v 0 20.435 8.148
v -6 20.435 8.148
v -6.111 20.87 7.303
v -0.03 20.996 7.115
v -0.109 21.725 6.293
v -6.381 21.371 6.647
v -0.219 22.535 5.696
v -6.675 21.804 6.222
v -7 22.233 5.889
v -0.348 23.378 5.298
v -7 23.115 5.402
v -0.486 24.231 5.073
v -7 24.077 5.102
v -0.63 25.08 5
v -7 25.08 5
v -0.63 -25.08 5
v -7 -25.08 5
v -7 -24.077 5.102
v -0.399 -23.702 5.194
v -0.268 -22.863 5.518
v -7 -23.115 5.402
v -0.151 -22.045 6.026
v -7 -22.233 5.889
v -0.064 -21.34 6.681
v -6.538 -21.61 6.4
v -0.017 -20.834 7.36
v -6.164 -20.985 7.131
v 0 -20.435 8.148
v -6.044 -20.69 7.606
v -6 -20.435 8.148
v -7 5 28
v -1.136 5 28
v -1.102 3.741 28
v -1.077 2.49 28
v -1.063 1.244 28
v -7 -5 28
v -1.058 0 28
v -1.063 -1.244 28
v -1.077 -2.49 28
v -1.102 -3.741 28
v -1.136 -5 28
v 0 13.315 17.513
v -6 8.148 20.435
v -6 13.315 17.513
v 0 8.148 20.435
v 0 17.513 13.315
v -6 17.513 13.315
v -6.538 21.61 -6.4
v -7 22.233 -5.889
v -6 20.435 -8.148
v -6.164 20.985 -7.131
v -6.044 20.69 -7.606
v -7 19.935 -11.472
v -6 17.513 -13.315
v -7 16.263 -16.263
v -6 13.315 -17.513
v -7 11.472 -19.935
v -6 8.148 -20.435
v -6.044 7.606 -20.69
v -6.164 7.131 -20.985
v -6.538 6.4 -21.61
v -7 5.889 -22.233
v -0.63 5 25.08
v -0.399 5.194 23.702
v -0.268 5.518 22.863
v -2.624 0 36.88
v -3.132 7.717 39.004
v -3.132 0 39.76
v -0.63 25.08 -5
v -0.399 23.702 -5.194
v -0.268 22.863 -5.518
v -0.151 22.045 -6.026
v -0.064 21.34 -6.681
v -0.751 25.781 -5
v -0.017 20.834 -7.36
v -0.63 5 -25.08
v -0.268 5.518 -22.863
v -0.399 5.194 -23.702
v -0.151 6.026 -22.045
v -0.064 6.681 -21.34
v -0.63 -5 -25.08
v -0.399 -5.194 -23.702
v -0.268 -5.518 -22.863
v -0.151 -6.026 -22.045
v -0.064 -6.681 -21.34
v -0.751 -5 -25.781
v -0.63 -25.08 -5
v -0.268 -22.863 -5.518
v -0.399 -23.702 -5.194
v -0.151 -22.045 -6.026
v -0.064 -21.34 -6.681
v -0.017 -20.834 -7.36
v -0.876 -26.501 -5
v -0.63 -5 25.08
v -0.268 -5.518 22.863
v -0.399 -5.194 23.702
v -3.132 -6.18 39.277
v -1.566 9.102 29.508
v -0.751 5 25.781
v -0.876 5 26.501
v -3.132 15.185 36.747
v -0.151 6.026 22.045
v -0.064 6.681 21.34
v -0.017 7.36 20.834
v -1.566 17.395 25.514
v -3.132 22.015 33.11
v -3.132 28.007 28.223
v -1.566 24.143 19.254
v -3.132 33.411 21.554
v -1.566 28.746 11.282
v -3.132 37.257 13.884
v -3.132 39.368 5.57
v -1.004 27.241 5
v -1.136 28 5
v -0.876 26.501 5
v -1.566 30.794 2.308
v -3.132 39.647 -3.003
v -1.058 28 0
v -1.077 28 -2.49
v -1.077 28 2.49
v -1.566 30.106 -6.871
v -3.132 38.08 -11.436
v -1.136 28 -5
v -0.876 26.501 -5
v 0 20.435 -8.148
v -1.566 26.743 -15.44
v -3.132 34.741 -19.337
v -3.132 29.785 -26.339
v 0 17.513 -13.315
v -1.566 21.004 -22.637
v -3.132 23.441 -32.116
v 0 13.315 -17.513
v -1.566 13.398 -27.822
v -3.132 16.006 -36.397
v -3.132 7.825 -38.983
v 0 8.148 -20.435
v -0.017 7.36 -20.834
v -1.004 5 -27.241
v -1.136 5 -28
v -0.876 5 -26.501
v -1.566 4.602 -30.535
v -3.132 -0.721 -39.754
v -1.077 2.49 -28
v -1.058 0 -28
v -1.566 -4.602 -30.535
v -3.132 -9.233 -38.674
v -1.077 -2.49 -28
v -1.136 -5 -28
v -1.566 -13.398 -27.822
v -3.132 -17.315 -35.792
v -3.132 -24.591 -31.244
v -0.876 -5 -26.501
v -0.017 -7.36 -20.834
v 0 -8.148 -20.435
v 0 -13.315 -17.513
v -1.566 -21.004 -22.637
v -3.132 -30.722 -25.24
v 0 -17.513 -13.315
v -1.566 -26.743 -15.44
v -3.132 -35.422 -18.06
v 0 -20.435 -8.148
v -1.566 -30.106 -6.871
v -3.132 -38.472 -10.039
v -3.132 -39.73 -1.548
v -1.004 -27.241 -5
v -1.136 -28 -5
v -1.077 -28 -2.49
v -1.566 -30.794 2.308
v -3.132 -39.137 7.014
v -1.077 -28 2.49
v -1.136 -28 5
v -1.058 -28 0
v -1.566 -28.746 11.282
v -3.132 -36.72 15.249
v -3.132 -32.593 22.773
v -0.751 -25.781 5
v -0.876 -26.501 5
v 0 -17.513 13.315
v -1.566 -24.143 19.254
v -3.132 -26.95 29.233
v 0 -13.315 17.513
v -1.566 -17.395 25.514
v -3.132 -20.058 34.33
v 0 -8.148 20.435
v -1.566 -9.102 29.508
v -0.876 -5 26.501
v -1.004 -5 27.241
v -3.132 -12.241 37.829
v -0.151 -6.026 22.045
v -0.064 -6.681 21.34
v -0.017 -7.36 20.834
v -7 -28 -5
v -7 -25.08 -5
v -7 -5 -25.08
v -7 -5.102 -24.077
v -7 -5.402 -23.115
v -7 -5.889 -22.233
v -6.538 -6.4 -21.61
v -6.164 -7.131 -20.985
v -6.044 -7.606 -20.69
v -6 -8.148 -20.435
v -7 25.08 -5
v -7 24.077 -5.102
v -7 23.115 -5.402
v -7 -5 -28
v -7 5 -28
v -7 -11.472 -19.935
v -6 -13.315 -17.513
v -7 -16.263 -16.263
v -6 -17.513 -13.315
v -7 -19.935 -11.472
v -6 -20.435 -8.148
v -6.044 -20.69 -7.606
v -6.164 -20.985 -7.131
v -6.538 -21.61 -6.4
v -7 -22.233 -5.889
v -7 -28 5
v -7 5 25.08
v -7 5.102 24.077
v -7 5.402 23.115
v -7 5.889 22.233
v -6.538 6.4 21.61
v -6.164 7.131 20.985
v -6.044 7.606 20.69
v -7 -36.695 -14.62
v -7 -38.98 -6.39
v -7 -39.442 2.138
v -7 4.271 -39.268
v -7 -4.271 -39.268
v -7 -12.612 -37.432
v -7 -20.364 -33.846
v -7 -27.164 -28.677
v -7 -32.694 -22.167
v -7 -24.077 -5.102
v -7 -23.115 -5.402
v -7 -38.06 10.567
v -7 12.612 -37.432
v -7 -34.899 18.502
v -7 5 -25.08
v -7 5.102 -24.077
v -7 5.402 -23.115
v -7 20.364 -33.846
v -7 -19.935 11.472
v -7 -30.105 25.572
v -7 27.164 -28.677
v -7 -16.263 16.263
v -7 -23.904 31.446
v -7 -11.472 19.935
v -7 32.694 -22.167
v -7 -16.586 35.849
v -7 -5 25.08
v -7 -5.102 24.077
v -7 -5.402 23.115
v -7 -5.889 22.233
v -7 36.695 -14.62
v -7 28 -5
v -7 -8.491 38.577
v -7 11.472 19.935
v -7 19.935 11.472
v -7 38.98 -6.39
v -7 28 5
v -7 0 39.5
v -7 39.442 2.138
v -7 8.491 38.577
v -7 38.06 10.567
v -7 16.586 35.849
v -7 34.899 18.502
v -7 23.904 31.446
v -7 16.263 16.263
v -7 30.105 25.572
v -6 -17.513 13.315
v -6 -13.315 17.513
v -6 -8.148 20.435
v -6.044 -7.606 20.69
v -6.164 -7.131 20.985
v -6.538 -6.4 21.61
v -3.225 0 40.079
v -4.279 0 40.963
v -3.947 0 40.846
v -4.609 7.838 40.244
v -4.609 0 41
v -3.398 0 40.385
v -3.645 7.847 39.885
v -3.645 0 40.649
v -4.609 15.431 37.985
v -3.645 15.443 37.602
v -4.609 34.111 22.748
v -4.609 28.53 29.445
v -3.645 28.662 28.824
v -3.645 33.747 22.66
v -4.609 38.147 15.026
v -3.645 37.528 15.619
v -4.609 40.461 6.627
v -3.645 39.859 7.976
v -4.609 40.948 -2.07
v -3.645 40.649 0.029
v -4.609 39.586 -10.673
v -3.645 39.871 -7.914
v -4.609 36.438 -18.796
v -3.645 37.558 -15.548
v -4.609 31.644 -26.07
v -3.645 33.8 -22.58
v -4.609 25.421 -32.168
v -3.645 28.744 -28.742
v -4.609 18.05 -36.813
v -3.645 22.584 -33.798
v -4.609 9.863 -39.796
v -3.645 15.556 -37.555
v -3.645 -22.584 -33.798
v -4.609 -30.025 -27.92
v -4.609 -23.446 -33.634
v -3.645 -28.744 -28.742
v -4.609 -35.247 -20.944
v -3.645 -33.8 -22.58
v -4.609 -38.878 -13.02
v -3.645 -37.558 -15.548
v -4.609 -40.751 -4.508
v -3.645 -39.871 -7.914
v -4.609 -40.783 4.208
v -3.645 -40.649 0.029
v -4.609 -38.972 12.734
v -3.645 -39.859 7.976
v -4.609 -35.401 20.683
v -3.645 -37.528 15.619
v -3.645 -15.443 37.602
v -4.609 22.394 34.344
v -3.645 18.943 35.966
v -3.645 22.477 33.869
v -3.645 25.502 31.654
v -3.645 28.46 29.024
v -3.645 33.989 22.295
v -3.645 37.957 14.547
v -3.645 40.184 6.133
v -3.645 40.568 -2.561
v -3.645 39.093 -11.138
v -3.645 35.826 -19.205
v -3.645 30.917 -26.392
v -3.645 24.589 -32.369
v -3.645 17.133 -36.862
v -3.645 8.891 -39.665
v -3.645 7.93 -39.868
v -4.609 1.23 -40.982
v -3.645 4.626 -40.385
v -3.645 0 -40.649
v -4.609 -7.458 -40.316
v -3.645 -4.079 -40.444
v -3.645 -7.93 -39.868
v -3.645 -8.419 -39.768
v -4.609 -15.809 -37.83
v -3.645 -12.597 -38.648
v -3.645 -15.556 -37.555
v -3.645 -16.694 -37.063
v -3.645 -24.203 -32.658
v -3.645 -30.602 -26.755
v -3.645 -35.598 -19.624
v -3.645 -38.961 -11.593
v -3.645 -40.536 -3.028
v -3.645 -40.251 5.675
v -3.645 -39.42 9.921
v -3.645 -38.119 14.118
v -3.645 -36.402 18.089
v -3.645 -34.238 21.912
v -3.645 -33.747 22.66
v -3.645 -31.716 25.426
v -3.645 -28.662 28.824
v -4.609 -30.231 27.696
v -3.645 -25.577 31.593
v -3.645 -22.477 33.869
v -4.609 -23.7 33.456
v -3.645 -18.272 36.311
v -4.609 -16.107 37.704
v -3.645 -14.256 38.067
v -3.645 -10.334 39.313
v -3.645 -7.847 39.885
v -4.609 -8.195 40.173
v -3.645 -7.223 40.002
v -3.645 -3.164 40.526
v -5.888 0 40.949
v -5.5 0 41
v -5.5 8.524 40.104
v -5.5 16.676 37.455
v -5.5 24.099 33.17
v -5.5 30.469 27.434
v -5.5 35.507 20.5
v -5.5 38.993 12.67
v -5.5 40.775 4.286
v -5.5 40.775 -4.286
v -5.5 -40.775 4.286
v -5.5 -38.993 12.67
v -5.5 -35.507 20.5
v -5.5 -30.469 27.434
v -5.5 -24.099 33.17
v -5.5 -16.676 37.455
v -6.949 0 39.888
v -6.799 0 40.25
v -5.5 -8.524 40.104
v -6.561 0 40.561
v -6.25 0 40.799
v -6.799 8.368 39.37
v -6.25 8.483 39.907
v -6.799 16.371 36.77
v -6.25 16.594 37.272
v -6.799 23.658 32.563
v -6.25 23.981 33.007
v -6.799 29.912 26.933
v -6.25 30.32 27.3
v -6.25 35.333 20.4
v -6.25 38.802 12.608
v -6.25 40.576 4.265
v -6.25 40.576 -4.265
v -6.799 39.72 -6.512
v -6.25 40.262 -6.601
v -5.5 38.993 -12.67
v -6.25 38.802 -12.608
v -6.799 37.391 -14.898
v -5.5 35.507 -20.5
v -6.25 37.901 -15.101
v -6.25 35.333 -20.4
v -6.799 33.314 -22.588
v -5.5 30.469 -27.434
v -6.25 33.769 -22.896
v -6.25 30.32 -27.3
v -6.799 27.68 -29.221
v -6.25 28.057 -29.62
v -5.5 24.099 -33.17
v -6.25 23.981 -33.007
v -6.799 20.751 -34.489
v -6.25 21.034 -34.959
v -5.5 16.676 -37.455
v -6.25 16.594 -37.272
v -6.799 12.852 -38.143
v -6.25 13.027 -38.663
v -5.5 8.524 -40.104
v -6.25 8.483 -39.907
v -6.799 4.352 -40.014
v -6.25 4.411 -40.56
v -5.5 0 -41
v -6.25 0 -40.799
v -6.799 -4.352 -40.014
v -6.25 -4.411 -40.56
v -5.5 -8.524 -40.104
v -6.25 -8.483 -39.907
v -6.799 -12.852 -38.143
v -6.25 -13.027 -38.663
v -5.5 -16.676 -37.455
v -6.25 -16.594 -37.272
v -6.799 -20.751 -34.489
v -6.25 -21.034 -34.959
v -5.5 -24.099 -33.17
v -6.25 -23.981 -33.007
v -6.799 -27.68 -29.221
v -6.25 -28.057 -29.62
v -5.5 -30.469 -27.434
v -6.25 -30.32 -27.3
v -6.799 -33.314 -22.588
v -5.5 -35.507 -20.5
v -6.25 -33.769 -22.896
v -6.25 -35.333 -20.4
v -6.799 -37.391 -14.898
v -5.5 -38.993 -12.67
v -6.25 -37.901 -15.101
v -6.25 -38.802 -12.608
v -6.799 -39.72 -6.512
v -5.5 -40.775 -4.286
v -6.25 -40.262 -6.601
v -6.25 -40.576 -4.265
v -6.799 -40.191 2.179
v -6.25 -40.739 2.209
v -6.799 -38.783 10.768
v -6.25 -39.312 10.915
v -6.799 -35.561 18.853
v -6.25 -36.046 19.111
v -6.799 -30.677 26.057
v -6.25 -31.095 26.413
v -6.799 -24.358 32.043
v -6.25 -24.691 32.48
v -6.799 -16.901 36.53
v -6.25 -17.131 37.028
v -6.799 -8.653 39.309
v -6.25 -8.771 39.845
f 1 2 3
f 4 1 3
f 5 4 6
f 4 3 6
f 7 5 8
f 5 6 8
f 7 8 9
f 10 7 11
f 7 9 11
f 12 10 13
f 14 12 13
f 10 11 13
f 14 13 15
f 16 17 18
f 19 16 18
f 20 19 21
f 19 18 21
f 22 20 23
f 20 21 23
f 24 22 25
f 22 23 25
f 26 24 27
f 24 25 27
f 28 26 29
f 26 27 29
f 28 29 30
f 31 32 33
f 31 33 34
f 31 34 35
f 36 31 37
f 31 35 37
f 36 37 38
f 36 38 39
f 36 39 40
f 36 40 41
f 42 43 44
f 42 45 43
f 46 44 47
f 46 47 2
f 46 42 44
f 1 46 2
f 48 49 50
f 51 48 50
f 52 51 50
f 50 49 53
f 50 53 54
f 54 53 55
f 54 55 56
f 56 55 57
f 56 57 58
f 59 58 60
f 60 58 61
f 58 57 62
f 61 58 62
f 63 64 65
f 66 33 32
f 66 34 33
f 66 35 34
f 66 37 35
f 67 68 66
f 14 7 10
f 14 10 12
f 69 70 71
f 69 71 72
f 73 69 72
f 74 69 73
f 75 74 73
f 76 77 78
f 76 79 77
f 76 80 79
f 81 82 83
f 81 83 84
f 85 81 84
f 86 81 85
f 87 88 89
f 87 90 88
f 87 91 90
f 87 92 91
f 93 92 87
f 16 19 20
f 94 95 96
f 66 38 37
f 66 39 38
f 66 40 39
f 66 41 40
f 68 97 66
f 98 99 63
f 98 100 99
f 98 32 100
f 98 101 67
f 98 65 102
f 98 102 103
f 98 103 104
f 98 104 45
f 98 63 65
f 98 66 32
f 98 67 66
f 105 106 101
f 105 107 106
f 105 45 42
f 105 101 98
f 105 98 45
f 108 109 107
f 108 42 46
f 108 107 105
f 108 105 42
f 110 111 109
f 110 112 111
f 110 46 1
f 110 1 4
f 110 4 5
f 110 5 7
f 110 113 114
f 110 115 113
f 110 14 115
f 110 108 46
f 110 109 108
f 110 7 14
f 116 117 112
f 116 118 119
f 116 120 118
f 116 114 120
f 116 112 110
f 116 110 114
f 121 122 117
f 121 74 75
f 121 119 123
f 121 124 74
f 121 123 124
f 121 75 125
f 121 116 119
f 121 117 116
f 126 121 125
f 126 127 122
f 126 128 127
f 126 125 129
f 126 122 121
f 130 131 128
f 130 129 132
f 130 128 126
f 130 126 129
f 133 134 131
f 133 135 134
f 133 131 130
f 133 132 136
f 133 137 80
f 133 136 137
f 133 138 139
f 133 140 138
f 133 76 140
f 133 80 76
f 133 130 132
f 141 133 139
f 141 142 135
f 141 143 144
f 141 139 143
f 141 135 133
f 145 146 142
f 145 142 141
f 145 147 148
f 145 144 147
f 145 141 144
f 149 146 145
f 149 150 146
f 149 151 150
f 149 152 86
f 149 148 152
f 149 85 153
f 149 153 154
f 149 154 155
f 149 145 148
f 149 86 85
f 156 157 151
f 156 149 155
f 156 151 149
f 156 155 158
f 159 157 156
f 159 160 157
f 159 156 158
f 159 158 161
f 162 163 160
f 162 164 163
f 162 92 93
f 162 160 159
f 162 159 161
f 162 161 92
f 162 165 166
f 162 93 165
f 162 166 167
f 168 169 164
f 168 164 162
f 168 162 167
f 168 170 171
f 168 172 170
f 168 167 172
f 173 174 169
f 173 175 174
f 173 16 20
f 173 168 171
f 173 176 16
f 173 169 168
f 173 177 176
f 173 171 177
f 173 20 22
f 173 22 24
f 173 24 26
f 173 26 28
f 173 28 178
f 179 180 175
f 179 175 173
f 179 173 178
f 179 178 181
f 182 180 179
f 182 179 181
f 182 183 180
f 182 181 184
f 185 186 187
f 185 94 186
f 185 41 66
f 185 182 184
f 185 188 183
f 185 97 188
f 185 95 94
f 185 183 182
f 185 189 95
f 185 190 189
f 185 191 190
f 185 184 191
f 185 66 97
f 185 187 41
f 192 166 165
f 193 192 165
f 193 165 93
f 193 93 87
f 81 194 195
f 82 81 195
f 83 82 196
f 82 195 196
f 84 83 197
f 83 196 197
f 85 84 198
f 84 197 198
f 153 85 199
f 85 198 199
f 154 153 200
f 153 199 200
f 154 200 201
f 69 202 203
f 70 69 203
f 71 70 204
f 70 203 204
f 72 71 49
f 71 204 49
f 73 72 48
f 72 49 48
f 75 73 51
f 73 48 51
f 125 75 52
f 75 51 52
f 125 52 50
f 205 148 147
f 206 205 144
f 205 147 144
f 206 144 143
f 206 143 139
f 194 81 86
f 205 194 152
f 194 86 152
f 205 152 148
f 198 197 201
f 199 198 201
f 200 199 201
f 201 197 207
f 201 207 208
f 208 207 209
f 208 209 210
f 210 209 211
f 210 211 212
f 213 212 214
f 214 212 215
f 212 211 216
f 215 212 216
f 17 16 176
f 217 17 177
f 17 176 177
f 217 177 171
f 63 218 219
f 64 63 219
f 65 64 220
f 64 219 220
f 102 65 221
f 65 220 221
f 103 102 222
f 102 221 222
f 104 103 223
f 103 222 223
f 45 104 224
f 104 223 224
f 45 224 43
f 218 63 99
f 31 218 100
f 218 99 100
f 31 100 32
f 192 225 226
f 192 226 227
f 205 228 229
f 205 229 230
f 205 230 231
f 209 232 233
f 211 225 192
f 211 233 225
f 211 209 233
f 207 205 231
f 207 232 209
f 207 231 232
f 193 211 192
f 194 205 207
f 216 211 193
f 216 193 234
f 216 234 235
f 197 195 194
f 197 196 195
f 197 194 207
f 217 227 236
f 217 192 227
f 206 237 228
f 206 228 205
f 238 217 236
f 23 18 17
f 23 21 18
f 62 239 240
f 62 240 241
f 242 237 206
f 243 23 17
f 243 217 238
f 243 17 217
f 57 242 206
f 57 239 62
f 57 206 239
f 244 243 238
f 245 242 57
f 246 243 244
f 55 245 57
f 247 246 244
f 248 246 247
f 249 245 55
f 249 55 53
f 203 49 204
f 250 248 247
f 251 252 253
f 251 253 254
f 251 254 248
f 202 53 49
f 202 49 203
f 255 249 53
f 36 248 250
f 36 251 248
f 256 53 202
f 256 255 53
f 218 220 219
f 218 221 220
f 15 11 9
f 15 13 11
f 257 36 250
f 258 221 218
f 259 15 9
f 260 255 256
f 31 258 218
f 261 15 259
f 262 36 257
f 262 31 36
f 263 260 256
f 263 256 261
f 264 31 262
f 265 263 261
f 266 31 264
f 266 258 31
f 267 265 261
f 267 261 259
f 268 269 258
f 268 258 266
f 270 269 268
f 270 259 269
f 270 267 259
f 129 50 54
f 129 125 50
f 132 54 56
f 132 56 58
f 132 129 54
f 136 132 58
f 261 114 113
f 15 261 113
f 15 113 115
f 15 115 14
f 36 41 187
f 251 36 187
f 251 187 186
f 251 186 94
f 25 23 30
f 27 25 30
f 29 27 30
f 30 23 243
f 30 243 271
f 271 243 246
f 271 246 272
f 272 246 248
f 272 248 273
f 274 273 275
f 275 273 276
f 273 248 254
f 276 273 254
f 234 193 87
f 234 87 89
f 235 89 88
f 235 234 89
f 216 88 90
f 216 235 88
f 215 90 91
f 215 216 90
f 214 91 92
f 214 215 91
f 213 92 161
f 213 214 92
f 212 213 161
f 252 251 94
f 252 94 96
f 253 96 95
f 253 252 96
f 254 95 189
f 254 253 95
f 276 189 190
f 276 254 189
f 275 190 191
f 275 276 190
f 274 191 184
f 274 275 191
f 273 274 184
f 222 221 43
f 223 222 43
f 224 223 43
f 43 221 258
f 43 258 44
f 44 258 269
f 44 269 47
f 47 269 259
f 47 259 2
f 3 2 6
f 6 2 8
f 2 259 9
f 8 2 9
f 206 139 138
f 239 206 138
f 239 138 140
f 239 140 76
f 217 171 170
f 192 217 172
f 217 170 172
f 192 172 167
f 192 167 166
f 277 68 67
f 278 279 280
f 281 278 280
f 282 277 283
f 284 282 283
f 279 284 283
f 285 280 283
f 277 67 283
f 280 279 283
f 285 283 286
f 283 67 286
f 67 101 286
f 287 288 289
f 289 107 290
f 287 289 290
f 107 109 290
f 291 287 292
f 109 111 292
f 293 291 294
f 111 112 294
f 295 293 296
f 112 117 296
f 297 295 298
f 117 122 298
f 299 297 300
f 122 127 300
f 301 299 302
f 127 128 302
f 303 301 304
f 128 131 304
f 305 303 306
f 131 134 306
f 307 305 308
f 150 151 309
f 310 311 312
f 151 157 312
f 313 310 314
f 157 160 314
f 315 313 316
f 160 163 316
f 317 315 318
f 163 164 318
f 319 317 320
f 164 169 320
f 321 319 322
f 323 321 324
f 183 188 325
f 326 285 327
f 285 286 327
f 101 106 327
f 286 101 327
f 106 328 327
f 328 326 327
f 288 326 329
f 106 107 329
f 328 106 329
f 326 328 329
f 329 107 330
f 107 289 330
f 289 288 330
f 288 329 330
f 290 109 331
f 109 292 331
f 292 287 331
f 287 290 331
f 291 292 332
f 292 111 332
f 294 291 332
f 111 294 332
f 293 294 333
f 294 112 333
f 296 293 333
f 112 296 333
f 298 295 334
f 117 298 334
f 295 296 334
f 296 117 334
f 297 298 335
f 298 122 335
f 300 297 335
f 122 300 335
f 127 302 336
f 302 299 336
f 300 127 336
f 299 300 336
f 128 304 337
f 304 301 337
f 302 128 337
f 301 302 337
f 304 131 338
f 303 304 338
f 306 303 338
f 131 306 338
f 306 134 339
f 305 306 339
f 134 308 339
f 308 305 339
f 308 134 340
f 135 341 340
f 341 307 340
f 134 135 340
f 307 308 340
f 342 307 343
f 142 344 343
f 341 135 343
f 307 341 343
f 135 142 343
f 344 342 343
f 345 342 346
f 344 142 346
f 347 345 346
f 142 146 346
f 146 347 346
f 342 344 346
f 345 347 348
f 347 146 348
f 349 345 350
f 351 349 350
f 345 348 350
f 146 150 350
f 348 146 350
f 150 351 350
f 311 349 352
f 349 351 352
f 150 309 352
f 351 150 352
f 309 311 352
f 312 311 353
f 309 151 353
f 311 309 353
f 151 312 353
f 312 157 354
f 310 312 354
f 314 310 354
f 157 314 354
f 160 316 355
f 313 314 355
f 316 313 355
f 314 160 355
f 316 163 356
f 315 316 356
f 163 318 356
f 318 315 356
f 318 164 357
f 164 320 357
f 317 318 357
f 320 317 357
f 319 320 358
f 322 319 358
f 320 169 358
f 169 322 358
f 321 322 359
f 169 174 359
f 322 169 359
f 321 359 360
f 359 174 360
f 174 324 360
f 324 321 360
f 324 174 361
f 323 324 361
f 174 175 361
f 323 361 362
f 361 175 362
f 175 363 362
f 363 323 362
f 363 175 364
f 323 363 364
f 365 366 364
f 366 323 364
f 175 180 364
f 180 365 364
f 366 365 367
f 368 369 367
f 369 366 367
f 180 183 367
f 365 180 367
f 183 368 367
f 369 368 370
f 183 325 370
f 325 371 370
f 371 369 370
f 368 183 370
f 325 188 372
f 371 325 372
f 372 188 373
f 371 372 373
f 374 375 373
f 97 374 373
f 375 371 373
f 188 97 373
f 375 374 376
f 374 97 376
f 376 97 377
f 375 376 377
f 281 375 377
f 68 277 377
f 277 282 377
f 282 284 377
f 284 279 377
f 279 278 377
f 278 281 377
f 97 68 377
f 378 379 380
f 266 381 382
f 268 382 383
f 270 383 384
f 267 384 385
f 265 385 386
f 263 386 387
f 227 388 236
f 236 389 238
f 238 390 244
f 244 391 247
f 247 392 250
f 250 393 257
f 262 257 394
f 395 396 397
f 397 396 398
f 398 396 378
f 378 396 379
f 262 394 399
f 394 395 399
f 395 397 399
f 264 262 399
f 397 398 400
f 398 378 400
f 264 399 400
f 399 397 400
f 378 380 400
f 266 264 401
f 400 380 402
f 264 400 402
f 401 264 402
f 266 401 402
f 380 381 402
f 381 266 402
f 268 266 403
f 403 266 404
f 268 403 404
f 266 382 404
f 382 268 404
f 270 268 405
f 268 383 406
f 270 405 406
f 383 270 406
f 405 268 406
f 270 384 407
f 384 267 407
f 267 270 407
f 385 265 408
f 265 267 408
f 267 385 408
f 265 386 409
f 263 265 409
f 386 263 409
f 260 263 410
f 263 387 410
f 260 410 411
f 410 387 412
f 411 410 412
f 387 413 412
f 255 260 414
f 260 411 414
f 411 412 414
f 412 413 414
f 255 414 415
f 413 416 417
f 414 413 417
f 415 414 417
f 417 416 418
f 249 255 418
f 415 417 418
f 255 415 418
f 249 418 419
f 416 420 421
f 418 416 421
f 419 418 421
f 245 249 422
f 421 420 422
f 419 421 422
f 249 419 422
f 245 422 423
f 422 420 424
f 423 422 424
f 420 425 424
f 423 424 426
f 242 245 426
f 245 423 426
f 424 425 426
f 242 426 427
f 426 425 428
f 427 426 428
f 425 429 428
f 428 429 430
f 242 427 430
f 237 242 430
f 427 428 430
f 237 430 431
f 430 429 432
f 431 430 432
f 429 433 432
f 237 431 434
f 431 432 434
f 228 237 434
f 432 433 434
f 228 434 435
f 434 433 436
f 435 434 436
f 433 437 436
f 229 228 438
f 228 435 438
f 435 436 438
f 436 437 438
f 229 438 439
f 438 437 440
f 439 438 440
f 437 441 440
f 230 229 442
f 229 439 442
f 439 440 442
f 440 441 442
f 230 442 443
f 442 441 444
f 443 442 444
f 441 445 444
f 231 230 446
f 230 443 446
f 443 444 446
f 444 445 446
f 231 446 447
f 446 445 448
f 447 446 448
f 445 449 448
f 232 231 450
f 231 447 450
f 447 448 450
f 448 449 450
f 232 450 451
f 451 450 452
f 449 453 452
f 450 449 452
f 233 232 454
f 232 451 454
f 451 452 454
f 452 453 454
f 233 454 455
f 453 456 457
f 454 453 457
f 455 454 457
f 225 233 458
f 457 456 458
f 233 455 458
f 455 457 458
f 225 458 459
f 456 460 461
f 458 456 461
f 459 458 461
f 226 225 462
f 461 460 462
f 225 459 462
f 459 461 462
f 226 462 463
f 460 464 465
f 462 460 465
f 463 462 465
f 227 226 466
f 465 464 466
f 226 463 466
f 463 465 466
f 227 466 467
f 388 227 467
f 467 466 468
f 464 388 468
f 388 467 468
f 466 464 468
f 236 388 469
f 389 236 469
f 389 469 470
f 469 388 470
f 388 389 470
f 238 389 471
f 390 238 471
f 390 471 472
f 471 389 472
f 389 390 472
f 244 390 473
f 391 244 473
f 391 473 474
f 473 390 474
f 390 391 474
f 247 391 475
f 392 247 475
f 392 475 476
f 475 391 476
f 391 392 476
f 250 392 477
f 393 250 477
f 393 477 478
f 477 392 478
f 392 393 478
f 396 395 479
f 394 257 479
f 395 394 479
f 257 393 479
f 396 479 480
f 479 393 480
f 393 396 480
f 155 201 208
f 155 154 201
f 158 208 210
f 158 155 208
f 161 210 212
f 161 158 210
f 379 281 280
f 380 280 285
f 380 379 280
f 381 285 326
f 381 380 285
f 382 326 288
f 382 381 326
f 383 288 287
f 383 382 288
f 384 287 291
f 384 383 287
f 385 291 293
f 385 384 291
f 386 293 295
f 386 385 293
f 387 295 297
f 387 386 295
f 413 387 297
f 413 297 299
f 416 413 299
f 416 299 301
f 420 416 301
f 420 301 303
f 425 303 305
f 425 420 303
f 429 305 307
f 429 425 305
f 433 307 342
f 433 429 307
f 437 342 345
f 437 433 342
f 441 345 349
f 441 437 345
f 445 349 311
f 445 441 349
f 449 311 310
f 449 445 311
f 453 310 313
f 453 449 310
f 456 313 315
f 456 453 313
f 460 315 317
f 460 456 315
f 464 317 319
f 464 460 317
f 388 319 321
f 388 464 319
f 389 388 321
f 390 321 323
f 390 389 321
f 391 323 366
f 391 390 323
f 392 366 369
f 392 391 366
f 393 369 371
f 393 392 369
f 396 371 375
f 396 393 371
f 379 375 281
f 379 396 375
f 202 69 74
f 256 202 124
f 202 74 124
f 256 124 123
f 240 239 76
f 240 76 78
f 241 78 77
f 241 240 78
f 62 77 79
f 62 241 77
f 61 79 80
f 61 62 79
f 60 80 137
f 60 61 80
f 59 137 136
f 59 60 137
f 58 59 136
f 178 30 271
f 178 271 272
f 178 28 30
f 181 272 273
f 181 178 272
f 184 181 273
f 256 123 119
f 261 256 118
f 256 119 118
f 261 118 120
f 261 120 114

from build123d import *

# Parameters (mm, degrees)
F3_DEPTH = 25
F4_SIZE  = 1
F5_R     = 5
F6_R     = 1.5


with BuildPart() as f1:
    # F0 (on Front) → F1 (revolve)
    with BuildSketch(Plane.XZ):
        Polygon((0, 22), (-3.3502126335, 41), (-7, 41), (-7, 22), align=None)
    revolve(axis=Axis((-11.3754170015, 0, 0), (-1, 0, 0)))

    # F2 (on Right) → F3 (cut)
    with BuildSketch(Plane.YZ):
        with BuildLine():
            Line((5, 21.4242852856), (5, 28))
            Line((5, 28), (0, 28))
            Line((0, 28), (-5, 28))
            Line((-5, 28), (-5, 21.4242852856))
            ThreePointArc((-5, 21.4242852856), (0, 22), (5, 21.4242852856))
        make_face()
        with BuildLine():
            Line((-27.9999999801, -5.0000001113), (-21.4242852658, -5.0000000852))
            ThreePointArc((-21.4242852658, -5.0000000852), (-22, -8.74e-08), (-21.4242853055, 4.9999999148))
            Line((-21.4242853055, 4.9999999148), (-28.0000000199, 4.9999998887))
            Line((-28.0000000199, 4.9999998887), (-28, -1.113e-07))
            Line((-28, -1.113e-07), (-27.9999999801, -5.0000001113))
        make_face()
        with BuildLine():
            Line((5.0000002226, -27.9999999603), (5.0000001703, -21.4242852459))
            ThreePointArc((5.0000001703, -21.4242852459), (1.749e-07, -22), (-4.9999998297, -21.4242853254))
            Line((-4.9999998297, -21.4242853254), (-4.9999997774, -28.0000000397))
            Line((-4.9999997774, -28.0000000397), (2.226e-07, -28))
            Line((2.226e-07, -28), (5.0000002226, -27.9999999603))
        make_face()
        with BuildLine():
            Line((27.9999999404, 5.0000003339), (21.424285226, 5.0000002555))
            ThreePointArc((21.424285226, 5.0000002555), (22, 2.623e-07), (21.4242853453, -4.9999997445))
            Line((21.4242853453, -4.9999997445), (28.0000000596, -4.9999996661))
            Line((28.0000000596, -4.9999996661), (28, 3.339e-07))
            Line((28, 3.339e-07), (27.9999999404, 5.0000003339))
        make_face()
    extrude(amount=-F3_DEPTH, mode=Mode.SUBTRACT)

    # F4
    f4_edges = [f1.edges().sort_by_distance(p)[0] for p in [
        (-7, 15.556349, 15.556349),
        (-7, -15.556349, 15.556349),
        (-7, -15.556349, -15.556349),
        (-7, 15.556349, -15.556349),
    ]]
    chamfer(f4_edges, length=F4_SIZE)

    # F5
    f5_edges = [f1.edges().sort_by_distance(p)[0] for p in [
        (-3, -5, -21.424285),
        (-3, 5, -21.424285),
        (-3, 21.424285, -5),
        (-3, 21.424285, 5),
        (-3, 5, 21.424285),
        (-3, -5, 21.424285),
        (-3, -21.424285, 5),
        (-3, -21.424285, -5),
    ]]
    fillet(f5_edges, radius=F5_R)

    # F6
    f6_edges = [f1.edges().sort_by_distance(p)[0] for p in [
        (-3.350213, 0, -41),
        (-7, 0, -41),
    ]]
    fillet(f6_edges, radius=F6_R)


solid = f1.part
